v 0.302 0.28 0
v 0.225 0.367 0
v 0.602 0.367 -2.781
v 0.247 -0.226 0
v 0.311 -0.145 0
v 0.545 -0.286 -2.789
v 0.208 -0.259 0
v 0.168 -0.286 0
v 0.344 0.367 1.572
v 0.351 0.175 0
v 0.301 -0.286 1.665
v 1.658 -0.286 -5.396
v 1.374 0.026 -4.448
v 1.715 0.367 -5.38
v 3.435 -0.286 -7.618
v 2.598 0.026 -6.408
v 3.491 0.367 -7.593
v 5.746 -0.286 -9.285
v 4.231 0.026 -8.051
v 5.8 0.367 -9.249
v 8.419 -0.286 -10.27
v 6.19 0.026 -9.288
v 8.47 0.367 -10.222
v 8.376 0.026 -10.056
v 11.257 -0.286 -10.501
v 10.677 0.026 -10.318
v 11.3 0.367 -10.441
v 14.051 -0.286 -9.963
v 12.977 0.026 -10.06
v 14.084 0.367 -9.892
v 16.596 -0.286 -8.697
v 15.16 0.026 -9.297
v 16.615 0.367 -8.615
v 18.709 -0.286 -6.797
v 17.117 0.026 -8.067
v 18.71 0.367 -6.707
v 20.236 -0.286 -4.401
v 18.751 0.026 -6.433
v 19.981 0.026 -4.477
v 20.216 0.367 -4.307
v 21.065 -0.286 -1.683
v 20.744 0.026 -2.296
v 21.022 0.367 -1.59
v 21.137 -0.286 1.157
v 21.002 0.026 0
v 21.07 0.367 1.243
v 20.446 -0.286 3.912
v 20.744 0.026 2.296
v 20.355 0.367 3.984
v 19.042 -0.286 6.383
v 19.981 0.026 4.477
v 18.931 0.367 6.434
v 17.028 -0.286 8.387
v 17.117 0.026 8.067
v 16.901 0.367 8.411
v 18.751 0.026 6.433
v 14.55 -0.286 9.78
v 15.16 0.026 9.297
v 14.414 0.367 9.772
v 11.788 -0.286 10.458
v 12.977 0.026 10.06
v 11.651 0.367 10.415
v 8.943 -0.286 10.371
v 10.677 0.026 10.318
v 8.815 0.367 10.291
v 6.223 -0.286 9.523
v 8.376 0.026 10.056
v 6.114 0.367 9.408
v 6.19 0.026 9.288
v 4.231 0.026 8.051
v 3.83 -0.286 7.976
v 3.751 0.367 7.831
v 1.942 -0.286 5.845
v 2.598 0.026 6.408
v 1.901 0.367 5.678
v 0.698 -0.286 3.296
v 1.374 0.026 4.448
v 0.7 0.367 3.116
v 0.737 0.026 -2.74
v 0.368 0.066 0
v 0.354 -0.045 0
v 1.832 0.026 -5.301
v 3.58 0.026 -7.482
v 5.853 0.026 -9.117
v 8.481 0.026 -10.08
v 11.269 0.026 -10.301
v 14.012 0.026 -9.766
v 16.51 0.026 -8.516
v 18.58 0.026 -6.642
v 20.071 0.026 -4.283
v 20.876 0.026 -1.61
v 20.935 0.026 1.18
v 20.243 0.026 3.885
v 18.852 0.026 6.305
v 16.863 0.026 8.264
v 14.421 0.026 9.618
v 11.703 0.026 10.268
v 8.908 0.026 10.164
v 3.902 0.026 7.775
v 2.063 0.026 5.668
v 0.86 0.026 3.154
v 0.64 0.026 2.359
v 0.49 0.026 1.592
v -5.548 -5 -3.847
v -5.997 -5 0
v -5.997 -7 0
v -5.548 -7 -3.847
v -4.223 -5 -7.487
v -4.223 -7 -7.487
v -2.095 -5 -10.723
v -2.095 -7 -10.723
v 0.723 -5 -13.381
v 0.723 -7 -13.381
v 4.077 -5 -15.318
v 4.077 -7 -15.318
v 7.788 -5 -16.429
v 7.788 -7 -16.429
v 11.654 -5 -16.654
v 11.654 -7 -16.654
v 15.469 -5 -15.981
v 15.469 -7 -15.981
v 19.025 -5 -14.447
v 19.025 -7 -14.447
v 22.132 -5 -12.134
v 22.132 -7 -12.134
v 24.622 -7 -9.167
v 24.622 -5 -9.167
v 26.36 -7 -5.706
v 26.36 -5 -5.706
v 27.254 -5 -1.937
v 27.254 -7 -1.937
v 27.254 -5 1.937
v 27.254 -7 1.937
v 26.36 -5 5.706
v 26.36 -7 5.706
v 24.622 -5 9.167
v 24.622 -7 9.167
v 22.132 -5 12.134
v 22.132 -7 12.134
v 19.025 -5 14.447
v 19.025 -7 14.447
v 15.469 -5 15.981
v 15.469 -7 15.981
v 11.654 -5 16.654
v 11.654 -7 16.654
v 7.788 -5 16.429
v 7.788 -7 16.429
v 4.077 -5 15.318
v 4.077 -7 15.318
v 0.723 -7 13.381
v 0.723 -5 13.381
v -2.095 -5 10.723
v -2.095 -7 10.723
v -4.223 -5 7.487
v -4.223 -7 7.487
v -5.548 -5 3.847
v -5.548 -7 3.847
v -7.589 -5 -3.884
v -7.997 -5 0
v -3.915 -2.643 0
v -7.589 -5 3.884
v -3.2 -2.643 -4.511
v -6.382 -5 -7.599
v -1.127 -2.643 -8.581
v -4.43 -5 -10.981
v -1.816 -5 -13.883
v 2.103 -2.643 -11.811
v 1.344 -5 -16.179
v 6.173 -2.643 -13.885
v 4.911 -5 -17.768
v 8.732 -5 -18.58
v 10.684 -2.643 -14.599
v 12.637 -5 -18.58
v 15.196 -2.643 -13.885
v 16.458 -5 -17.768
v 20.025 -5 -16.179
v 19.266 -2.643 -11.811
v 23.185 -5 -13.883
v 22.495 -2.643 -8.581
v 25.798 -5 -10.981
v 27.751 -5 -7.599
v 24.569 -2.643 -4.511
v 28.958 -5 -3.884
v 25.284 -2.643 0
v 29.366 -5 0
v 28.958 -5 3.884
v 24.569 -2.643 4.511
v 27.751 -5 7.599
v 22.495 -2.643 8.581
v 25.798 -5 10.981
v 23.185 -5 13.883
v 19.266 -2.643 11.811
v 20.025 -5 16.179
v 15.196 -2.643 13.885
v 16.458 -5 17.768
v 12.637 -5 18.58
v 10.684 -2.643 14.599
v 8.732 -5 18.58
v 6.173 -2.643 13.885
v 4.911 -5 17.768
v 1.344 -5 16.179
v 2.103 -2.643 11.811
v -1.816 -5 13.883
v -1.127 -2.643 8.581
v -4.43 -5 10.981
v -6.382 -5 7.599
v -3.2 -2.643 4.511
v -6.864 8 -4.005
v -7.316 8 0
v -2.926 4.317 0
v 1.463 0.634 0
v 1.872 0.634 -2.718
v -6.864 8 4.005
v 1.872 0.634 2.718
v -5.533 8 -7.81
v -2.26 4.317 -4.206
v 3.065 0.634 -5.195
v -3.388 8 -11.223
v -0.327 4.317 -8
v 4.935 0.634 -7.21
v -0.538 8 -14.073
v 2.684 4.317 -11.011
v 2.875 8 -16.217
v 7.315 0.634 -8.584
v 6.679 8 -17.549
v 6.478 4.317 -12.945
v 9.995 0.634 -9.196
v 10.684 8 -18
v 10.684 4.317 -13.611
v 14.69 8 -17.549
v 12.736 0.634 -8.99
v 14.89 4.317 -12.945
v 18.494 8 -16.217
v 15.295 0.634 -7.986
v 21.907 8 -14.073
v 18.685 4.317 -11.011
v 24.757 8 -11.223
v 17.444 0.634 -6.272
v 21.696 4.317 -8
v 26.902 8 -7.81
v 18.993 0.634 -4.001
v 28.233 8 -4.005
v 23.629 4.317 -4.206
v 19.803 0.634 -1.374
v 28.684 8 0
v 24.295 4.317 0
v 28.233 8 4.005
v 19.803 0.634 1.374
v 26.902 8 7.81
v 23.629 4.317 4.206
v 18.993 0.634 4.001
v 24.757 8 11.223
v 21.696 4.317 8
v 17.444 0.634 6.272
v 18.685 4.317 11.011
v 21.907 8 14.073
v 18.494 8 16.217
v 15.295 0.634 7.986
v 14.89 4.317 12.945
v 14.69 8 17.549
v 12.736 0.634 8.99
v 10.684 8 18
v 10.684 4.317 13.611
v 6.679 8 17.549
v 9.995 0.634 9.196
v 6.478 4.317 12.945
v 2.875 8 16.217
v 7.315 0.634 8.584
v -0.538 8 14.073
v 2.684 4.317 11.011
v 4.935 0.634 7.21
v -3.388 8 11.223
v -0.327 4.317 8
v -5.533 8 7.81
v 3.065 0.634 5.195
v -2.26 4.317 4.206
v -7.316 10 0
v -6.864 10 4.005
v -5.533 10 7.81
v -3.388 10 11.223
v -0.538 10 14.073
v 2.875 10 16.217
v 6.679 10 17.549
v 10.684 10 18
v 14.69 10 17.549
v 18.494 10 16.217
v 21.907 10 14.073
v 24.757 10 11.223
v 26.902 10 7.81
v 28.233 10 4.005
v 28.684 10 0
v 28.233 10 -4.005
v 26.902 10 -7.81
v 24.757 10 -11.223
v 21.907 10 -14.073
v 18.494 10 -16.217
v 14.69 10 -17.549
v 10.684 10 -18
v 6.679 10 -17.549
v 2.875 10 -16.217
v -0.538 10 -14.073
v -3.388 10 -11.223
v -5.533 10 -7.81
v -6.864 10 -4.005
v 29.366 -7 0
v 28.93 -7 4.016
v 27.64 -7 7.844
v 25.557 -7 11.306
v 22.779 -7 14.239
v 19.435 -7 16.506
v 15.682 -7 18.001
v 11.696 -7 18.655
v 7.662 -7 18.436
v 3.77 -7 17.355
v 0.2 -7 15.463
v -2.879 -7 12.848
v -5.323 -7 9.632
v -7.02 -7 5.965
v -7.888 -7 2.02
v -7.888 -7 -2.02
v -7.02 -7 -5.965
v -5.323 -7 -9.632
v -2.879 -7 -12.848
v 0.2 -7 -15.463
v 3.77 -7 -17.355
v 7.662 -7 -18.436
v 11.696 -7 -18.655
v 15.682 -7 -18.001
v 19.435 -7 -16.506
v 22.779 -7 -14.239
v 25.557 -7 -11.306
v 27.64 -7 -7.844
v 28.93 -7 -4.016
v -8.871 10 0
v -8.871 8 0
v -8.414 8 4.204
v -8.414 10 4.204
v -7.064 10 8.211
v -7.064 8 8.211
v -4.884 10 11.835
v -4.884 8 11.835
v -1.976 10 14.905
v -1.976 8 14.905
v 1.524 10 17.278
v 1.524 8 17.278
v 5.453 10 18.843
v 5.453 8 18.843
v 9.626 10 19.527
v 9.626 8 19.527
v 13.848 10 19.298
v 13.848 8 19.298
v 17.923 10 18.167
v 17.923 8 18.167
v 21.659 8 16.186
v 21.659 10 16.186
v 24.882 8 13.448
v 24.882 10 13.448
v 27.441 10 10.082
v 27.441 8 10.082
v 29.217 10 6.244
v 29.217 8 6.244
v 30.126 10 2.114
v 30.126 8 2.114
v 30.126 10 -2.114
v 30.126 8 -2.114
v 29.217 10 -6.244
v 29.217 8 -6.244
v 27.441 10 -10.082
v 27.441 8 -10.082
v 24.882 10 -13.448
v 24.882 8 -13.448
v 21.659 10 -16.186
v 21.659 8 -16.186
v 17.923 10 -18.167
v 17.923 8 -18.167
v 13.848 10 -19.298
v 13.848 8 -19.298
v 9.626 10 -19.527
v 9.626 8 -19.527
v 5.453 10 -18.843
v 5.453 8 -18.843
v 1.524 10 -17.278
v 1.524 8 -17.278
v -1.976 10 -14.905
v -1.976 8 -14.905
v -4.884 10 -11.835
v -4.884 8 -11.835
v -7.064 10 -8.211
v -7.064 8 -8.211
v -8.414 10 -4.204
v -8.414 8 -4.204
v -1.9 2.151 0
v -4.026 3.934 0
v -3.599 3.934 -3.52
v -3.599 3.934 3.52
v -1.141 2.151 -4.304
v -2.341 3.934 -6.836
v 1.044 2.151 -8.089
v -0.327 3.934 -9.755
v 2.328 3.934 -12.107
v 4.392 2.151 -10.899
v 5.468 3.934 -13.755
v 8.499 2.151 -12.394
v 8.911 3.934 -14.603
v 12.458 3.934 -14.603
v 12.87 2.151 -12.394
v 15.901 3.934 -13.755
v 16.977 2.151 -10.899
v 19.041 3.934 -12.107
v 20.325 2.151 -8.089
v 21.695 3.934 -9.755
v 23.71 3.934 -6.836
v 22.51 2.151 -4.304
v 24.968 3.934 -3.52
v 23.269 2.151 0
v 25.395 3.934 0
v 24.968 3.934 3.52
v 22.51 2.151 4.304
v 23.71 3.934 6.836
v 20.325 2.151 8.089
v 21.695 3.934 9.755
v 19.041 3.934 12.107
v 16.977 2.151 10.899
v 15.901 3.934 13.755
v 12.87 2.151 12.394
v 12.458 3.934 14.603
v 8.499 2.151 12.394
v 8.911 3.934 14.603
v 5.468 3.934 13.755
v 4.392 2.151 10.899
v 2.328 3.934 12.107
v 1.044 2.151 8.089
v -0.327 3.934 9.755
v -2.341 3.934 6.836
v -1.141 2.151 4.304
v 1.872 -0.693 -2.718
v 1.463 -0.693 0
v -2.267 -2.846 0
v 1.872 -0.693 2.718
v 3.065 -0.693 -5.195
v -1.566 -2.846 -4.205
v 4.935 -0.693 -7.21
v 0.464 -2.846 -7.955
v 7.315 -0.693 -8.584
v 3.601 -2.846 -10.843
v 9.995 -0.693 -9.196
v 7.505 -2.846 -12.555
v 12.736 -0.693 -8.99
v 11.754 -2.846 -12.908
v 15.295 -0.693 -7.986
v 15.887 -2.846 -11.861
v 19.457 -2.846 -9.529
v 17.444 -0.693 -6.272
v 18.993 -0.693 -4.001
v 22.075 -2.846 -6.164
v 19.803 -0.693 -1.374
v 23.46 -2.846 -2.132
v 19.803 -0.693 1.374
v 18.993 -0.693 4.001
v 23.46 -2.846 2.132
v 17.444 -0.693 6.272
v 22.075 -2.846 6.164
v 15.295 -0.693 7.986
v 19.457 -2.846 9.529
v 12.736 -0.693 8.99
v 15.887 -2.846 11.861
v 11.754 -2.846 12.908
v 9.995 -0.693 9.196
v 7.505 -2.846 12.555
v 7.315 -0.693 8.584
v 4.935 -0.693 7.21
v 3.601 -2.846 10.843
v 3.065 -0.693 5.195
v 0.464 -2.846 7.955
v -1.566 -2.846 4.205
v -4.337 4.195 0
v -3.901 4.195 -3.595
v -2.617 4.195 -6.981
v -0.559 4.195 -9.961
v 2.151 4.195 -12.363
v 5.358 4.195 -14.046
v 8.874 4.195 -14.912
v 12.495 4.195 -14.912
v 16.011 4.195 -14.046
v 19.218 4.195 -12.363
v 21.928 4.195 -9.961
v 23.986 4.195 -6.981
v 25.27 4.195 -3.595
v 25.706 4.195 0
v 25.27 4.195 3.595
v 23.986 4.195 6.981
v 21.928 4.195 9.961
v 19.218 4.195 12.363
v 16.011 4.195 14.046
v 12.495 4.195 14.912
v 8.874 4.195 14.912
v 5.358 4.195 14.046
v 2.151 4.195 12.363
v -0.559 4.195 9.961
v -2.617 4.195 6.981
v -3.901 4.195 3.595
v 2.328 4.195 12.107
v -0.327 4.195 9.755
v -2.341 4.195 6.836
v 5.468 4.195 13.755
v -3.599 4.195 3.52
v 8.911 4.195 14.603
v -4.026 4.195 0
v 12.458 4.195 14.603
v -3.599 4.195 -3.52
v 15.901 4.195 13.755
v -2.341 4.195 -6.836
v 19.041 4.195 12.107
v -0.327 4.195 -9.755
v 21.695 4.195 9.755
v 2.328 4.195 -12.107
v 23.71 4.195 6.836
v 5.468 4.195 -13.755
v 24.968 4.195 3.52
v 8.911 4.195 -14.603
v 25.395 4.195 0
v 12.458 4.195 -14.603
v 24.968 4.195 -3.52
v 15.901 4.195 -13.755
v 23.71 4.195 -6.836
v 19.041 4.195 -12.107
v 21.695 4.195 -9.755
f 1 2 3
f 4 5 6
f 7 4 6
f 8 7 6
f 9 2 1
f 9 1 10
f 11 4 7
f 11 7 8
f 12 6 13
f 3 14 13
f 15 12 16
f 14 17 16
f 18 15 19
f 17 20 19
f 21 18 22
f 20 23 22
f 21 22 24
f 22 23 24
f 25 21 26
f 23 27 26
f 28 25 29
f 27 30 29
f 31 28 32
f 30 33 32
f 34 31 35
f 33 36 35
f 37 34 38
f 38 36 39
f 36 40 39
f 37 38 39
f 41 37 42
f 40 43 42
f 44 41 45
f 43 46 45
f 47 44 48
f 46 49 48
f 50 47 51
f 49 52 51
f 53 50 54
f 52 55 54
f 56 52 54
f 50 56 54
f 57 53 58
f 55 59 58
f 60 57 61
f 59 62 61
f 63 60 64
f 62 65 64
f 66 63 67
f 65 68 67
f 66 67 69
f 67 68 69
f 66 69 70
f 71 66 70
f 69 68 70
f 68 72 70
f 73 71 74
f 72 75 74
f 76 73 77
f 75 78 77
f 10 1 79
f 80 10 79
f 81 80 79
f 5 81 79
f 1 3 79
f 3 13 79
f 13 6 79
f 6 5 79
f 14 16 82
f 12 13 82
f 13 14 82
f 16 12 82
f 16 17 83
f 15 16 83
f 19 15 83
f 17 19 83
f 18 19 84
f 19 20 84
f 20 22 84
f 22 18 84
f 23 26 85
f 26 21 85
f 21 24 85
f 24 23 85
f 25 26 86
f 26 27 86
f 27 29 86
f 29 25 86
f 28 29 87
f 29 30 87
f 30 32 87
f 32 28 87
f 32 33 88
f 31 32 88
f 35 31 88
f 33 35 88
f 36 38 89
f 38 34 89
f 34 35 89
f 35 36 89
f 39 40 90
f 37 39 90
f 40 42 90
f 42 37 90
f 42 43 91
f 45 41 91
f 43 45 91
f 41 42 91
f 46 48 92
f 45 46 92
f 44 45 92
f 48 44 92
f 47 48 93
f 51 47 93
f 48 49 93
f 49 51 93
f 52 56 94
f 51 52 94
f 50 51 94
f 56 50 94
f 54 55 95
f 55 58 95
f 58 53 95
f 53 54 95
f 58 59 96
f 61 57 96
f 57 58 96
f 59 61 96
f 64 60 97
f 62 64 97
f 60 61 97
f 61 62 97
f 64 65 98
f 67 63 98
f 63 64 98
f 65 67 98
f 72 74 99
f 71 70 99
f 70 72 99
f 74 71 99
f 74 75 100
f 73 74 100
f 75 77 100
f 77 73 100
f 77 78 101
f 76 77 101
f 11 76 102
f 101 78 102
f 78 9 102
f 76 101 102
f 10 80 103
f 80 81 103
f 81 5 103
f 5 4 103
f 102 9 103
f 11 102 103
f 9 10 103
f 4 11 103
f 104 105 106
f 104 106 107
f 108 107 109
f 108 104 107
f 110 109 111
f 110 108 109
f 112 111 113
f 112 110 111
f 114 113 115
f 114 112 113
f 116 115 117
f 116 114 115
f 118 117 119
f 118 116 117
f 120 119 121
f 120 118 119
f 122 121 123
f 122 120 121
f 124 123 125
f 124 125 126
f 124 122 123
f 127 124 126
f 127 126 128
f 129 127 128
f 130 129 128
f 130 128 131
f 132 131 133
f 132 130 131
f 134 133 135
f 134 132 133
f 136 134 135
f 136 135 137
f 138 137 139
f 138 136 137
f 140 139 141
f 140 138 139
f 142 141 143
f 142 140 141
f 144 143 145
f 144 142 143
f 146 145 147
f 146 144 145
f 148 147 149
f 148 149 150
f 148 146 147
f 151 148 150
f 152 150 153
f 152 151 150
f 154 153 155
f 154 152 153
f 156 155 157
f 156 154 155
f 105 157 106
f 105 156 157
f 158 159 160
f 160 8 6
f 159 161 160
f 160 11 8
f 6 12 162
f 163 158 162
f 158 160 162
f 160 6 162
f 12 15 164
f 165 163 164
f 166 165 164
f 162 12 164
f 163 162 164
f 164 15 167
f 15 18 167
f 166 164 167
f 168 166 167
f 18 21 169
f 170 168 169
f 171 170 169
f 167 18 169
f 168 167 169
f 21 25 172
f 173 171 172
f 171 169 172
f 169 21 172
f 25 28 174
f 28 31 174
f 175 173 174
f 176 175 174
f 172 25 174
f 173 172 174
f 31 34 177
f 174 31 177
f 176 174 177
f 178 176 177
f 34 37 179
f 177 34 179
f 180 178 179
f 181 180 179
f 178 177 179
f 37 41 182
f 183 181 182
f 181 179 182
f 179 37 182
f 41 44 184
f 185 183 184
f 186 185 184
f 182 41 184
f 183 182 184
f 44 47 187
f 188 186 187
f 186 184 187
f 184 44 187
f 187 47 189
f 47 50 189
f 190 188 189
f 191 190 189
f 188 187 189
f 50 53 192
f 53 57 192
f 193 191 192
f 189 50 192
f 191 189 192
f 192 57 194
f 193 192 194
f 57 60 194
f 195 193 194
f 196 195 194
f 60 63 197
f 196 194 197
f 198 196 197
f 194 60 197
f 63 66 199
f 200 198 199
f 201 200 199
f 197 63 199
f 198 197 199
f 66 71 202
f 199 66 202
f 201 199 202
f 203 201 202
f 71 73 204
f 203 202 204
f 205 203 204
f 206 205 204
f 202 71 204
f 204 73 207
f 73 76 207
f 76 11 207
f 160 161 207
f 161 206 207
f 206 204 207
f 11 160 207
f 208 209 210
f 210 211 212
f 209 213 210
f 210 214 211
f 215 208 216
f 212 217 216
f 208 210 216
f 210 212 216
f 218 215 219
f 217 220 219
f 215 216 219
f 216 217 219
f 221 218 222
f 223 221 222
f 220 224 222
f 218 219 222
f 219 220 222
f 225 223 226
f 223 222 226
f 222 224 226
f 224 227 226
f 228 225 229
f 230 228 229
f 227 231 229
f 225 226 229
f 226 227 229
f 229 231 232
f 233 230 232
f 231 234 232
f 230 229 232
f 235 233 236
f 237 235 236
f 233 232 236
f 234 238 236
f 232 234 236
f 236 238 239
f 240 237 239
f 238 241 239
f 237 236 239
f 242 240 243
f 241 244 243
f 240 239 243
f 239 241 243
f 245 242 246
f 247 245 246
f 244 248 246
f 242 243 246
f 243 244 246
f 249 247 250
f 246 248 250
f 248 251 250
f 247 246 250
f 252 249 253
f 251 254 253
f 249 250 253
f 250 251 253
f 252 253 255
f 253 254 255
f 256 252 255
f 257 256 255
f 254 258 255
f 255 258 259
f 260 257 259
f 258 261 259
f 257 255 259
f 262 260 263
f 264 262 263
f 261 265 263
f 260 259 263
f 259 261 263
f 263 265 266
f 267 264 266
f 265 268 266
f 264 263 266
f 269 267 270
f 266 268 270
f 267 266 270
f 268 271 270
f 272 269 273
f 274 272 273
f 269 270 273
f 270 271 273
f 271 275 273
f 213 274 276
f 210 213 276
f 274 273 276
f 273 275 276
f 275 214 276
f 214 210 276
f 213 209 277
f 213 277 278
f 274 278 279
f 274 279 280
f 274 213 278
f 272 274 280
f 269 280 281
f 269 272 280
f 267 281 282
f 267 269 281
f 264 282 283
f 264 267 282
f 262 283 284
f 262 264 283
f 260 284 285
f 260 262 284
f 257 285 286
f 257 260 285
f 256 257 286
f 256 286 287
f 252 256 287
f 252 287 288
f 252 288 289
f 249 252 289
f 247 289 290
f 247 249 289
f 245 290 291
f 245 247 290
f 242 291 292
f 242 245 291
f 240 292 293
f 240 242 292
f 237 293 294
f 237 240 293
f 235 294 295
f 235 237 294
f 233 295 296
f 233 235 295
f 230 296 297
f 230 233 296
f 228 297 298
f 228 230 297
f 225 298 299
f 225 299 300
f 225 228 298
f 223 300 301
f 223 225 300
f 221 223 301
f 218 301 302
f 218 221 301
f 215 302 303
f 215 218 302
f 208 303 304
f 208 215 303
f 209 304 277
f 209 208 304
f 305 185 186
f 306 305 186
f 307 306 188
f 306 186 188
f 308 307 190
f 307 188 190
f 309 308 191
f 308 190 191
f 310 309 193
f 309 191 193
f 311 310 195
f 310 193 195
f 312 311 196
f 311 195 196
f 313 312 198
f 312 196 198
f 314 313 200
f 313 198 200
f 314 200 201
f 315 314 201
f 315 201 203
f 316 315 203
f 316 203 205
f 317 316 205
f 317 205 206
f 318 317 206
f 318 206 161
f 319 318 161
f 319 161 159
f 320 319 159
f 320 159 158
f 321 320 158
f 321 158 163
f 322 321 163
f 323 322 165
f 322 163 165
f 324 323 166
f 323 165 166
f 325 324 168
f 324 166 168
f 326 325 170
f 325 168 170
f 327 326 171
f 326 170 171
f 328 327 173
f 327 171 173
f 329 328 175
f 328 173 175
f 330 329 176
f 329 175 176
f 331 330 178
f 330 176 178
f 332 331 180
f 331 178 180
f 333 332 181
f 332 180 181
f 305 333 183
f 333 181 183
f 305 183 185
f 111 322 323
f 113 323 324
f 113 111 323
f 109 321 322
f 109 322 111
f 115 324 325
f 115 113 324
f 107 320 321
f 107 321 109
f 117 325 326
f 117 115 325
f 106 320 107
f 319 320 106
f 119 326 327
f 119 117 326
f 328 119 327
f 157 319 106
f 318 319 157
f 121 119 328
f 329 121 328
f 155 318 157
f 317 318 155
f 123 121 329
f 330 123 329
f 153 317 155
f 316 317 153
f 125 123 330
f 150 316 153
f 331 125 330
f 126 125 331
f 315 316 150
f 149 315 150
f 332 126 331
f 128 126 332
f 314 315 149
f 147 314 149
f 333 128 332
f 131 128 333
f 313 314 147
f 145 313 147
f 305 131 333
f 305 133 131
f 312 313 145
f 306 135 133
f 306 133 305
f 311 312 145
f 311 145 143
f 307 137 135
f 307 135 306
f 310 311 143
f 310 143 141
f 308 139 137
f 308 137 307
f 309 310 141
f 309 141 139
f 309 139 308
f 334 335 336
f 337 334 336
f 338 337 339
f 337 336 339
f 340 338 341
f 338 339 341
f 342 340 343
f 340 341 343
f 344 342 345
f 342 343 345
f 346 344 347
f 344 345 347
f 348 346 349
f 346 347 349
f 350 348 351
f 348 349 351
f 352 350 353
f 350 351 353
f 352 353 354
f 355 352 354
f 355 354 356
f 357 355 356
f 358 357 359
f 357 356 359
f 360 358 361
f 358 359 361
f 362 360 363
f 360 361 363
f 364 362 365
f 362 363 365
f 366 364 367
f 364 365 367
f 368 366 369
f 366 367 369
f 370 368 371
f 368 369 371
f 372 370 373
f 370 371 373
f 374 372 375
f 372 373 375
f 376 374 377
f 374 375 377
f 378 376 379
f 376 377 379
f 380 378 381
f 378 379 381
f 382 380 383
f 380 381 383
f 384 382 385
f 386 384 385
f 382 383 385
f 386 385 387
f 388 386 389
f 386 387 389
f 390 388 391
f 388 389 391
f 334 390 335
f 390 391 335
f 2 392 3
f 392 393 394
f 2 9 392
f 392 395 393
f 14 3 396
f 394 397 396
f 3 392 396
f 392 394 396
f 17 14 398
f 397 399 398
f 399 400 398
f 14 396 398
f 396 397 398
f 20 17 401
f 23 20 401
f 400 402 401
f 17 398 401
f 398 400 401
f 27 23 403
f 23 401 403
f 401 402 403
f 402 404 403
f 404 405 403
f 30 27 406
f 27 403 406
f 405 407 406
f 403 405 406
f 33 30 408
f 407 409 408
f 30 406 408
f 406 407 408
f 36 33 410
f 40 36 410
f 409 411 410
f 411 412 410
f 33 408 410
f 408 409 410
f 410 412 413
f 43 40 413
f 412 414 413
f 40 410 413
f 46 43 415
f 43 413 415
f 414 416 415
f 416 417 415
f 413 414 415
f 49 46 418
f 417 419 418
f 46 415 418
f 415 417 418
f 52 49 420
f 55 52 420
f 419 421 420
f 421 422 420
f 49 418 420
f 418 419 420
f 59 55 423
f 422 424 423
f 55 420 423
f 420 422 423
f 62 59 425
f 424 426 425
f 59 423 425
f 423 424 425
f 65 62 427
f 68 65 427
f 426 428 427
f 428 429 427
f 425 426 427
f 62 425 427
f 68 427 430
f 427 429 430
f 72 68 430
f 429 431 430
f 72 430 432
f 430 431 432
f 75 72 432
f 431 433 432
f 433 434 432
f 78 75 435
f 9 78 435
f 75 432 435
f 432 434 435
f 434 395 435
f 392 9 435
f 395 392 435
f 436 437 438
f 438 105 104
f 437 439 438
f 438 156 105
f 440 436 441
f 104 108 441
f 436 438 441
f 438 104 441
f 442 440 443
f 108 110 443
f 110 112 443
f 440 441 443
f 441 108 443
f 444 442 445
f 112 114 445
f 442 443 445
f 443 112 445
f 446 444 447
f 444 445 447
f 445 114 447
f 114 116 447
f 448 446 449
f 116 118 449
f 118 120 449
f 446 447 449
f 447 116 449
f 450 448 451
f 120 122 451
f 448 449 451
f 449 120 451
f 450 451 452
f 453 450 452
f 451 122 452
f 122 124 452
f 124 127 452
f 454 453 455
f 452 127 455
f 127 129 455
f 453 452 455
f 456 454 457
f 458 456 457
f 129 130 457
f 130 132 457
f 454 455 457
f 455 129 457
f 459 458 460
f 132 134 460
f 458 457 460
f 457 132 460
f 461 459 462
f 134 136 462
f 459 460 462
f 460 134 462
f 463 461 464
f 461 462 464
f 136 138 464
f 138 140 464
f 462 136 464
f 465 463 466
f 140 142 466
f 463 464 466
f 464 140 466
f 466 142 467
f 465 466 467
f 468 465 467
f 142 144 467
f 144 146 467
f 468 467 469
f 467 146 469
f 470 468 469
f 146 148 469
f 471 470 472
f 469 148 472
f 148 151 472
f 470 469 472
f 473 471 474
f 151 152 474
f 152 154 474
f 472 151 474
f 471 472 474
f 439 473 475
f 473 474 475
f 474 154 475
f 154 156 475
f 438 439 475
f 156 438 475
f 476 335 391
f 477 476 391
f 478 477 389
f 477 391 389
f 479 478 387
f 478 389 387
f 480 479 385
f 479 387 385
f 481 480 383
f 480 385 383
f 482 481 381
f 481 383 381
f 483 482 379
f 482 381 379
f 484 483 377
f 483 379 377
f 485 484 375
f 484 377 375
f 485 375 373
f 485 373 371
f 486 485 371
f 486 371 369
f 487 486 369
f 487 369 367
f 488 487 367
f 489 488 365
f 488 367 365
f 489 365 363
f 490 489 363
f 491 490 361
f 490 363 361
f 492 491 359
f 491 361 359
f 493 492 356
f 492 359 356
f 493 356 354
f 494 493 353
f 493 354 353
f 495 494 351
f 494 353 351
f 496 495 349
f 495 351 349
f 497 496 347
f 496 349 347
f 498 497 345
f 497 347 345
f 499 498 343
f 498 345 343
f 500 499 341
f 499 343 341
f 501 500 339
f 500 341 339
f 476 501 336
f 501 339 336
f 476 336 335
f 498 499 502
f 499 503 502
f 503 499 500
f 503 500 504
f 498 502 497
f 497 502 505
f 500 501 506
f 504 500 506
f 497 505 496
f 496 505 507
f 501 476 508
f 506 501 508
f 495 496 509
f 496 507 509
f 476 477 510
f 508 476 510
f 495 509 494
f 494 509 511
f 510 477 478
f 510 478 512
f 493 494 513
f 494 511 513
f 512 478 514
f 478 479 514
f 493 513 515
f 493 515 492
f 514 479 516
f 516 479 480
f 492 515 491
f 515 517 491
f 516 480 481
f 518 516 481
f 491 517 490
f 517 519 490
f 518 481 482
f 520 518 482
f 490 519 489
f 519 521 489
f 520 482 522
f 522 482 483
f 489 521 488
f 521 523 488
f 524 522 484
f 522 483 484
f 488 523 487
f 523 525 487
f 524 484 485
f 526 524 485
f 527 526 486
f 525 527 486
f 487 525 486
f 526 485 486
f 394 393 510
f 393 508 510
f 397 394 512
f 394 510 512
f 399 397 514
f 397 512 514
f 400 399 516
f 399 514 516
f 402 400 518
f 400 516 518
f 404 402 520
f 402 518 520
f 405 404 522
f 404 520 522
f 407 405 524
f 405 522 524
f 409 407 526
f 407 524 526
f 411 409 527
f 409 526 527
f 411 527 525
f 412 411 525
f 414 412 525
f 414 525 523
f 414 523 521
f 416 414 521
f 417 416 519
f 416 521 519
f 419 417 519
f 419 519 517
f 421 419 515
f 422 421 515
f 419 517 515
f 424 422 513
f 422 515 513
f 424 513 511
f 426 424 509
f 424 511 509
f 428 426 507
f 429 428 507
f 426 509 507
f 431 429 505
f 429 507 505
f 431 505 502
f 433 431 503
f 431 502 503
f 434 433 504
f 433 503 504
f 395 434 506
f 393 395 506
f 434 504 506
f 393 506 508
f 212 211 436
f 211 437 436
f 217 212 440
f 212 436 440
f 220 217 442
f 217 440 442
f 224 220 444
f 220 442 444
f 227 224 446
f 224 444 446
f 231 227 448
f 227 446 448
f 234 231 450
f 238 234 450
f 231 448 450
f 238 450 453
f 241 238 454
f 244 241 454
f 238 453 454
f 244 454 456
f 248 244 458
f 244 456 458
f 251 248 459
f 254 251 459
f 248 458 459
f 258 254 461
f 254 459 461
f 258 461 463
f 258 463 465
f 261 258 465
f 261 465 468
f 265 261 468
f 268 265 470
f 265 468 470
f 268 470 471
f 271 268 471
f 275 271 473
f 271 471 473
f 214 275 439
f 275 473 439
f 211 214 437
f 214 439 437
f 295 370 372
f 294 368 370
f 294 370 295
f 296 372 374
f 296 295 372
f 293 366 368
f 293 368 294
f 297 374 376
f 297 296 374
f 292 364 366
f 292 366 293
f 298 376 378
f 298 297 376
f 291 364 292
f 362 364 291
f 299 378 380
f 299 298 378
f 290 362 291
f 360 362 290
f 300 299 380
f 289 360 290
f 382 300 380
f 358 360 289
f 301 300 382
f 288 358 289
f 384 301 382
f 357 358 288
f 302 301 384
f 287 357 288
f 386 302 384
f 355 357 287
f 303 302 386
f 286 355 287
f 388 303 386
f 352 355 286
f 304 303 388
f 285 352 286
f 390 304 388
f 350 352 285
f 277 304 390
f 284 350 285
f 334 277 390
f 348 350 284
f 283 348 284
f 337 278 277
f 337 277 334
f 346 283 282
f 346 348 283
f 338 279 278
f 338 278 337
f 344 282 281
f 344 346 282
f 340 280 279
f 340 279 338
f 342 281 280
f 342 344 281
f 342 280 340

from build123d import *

# Parameters (mm, degrees)
FILLET2_R           = 0.4
SKETCH2_R           = 19.555723827
SKETCH2_R_2         = 18
BOSS_EXTRUDE1_DEPTH = 2
SKETCH3_R           = 18.681949124
SKETCH3_R_2         = 16.681949124
BOSS_EXTRUDE2_DEPTH = 2


with BuildPart() as part:
    # Sketch1 → Revolve1 (revolve)
    with BuildSketch(Plane.XY):
        Polygon((0.662781953, 0), (-4.026073282, 3.934416698), (-4.026073282, 4.195498156), (-4.337218047, 4.195498156), (-8.871246788, 8), (-7.315522961, 8), (1.462781953, 0.634127584), (1.462781953, -0.692820323), (-5.997472085, -5), (-7.997472085, -5), align=None)
    revolve(axis=Axis((10.684477039, 7.609018033, 0), (0, -1, 0)))

    # Fillet2
    fillet2_edges = [part.edges().sort_by_distance(p)[0] for p in [
        (20.706172125, 0, 0),
    ]]
    fillet(fillet2_edges, radius=FILLET2_R)

    # Sketch2 → Boss-Extrude1 (add)
    with BuildSketch(Plane(origin=(0, 8, 0), x_dir=(1, 0, 0), z_dir=(0, 1, 0))):
        with Locations(Location((10.684477039, 0, 0), (0, 0, 180))):
            Circle(SKETCH2_R)
        with Locations(Location((10.684477039, 0, 0), (0, 0, 180))):
            Circle(SKETCH2_R_2, mode=Mode.SUBTRACT)
    extrude(amount=BOSS_EXTRUDE1_DEPTH)

    # Sketch3 → Boss-Extrude2 (add)
    with BuildSketch(Plane.XZ.offset(5)):
        with Locations((10.684477039, 0)):
            Circle(SKETCH3_R)
        with Locations(Location((10.684477039, 0, 0), (0, 0, 180))):
            Circle(SKETCH3_R_2, mode=Mode.SUBTRACT)
    extrude(amount=BOSS_EXTRUDE2_DEPTH)


solid = part.part
